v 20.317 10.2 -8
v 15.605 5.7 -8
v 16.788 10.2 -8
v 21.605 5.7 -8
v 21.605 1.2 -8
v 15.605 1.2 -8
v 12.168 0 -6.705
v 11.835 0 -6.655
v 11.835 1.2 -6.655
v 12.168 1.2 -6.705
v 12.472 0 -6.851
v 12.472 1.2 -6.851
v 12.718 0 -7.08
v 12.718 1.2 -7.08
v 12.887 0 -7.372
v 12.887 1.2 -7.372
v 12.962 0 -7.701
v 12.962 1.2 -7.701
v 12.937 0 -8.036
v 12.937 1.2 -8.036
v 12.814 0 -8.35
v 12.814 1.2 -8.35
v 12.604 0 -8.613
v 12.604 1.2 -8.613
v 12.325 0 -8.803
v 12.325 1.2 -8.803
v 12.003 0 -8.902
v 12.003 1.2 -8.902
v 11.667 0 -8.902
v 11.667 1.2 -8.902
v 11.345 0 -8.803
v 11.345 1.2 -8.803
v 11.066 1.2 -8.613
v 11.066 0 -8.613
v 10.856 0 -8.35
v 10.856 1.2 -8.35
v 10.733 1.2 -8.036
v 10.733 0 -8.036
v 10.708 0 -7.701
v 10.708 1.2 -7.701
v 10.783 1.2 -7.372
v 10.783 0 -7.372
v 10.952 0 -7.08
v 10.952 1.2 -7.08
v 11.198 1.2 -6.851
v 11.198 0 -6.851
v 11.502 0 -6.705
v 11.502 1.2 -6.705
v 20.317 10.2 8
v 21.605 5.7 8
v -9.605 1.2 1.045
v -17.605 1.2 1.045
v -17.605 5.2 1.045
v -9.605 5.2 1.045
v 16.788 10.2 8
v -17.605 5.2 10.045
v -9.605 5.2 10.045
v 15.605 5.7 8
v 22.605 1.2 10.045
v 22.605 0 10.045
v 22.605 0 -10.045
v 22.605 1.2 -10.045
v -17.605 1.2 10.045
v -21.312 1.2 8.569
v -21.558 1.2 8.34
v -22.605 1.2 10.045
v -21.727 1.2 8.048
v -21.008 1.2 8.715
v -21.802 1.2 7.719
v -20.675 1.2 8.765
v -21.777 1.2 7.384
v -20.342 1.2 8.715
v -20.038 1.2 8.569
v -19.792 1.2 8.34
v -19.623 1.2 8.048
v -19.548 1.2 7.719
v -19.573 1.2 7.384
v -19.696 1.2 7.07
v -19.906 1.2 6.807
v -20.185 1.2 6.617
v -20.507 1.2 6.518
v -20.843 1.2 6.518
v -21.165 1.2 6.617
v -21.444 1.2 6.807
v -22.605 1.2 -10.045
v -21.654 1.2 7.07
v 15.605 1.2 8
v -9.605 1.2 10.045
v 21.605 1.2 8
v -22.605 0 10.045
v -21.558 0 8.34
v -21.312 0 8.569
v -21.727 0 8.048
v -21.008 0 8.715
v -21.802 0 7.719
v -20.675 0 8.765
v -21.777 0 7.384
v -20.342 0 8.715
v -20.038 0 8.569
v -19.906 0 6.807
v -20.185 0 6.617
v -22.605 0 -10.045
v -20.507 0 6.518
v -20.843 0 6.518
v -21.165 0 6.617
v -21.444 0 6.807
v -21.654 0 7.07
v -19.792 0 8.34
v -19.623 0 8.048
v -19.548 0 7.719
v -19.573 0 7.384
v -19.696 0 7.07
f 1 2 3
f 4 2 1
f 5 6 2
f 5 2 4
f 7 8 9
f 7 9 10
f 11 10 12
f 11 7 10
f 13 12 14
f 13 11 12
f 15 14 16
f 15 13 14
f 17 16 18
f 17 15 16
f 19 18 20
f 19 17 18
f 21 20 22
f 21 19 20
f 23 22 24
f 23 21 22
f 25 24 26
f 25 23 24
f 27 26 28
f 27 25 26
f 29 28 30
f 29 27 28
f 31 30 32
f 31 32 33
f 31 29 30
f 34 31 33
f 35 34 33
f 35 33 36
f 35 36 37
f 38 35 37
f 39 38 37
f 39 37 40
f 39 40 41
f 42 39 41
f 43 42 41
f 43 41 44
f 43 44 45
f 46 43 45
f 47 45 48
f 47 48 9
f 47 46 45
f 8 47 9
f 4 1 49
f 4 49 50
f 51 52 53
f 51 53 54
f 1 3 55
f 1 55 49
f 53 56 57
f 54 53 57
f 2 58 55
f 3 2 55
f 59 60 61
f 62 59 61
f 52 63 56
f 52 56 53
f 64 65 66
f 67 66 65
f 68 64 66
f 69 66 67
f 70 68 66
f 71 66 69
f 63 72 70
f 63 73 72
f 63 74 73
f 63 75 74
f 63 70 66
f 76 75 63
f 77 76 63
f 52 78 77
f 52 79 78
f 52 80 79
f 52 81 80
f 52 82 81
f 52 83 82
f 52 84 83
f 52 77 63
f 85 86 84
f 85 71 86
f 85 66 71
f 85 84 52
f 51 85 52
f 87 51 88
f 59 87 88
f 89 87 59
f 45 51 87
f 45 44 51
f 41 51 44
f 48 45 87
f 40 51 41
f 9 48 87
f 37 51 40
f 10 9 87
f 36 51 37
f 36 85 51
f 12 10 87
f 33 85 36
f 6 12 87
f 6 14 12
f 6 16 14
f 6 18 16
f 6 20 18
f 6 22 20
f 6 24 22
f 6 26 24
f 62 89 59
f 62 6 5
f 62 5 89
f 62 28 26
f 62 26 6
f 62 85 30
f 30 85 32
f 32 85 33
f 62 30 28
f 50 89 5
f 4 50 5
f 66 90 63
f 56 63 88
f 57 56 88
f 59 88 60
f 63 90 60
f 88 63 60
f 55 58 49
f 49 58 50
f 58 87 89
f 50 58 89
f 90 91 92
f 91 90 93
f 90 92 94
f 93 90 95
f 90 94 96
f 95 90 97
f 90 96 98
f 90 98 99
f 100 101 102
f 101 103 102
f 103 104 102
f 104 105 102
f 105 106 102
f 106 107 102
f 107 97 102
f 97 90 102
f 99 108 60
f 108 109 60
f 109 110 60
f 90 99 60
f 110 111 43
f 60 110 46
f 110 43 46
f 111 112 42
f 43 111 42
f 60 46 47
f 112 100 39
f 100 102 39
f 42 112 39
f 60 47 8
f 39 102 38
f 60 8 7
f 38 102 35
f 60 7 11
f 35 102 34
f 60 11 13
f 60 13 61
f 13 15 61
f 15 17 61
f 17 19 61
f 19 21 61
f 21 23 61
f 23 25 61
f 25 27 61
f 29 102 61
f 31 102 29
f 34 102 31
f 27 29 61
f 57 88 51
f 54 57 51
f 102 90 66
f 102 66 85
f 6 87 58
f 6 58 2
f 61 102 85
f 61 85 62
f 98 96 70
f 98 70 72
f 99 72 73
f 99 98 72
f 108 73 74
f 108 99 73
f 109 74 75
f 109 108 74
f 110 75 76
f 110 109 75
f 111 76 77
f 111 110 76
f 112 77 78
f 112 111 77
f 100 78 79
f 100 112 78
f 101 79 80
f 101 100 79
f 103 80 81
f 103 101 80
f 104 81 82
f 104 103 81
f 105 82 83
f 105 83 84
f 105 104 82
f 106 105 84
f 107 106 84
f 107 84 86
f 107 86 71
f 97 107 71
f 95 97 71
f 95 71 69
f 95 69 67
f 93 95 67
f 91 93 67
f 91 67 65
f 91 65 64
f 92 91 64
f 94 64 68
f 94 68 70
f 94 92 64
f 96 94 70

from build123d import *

# Parameters (mm, degrees)
SKETCH1_W           = 45.21
SKETCH1_H           = 20.09
SKETCH1_R           = 1.13
BOSS_EXTRUDE1_DEPTH = 1.2
SKETCH2_W           = 6
SKETCH2_H           = 16
BOSS_EXTRUDE3_DEPTH = 9
CUT_EXTRUDE1_REACH  = 32.67
SKETCH5_W           = 8
SKETCH5_H           = 9
BOSS_EXTRUDE5_DEPTH = 4


with BuildPart() as part:
    # Sketch1 → Boss-Extrude1 (new body)
    with BuildSketch(Plane(origin=(0, 0, 0), x_dir=(1, 0, 0), z_dir=(0, 1, 0))):
        Rectangle(SKETCH1_W, SKETCH1_H)
        with Locations(Location((11.835, 7.785, 0), (0, 0, 270))):
            Circle(SKETCH1_R, mode=Mode.SUBTRACT)
        with Locations(Location((-20.675, -7.635, 0), (0, 0, 270))):
            Circle(SKETCH1_R, mode=Mode.SUBTRACT)
    extrude(amount=BOSS_EXTRUDE1_DEPTH)

    # Sketch2 → Boss-Extrude3 (add)
    with BuildSketch(Plane(origin=(0, 1.2, 0), x_dir=(1, 0, 0), z_dir=(0, 1, 0))):
        with Locations((18.605, 0)):
            Rectangle(SKETCH2_W, SKETCH2_H)
    extrude(amount=BOSS_EXTRUDE3_DEPTH)

    # Sketch4 → Cut-Extrude1 (cut, up to next)
    with BuildSketch(Plane.XY.offset(8), mode=Mode.PRIVATE) as cut_extrude1_sk1:
        Polygon((15.605, 5.7), (16.788227765, 10.2), (15.605, 10.2), align=None)
    cut_extrude1_tool1 = extrude(cut_extrude1_sk1.sketch, amount=-CUT_EXTRUDE1_REACH, mode=Mode.PRIVATE) & part.part
    # Sketch4 → Cut-Extrude1 (cut, up to next)
    with BuildSketch(Plane.XY.offset(8), mode=Mode.PRIVATE) as cut_extrude1_sk2:
        Polygon((20.317369028, 10.2), (21.605, 5.7), (21.605, 10.2), align=None)
    cut_extrude1_tool2 = extrude(cut_extrude1_sk2.sketch, amount=-CUT_EXTRUDE1_REACH, mode=Mode.PRIVATE) & part.part
    add(cut_extrude1_tool1.solids().sort_by_distance((15.999409, 8.7, 8))[0], mode=Mode.SUBTRACT)
    add(cut_extrude1_tool2.solids().sort_by_distance((21.17579, 8.7, 8))[0], mode=Mode.SUBTRACT)

    # Sketch5 → Boss-Extrude5 (add)
    with BuildSketch(Plane(origin=(0, 1.2, 0), x_dir=(1, 0, 0), z_dir=(0, 1, 0))):
        with Locations((-13.605, -5.545)):
            Rectangle(SKETCH5_W, SKETCH5_H)
    extrude(amount=BOSS_EXTRUDE5_DEPTH)


solid = part.part
